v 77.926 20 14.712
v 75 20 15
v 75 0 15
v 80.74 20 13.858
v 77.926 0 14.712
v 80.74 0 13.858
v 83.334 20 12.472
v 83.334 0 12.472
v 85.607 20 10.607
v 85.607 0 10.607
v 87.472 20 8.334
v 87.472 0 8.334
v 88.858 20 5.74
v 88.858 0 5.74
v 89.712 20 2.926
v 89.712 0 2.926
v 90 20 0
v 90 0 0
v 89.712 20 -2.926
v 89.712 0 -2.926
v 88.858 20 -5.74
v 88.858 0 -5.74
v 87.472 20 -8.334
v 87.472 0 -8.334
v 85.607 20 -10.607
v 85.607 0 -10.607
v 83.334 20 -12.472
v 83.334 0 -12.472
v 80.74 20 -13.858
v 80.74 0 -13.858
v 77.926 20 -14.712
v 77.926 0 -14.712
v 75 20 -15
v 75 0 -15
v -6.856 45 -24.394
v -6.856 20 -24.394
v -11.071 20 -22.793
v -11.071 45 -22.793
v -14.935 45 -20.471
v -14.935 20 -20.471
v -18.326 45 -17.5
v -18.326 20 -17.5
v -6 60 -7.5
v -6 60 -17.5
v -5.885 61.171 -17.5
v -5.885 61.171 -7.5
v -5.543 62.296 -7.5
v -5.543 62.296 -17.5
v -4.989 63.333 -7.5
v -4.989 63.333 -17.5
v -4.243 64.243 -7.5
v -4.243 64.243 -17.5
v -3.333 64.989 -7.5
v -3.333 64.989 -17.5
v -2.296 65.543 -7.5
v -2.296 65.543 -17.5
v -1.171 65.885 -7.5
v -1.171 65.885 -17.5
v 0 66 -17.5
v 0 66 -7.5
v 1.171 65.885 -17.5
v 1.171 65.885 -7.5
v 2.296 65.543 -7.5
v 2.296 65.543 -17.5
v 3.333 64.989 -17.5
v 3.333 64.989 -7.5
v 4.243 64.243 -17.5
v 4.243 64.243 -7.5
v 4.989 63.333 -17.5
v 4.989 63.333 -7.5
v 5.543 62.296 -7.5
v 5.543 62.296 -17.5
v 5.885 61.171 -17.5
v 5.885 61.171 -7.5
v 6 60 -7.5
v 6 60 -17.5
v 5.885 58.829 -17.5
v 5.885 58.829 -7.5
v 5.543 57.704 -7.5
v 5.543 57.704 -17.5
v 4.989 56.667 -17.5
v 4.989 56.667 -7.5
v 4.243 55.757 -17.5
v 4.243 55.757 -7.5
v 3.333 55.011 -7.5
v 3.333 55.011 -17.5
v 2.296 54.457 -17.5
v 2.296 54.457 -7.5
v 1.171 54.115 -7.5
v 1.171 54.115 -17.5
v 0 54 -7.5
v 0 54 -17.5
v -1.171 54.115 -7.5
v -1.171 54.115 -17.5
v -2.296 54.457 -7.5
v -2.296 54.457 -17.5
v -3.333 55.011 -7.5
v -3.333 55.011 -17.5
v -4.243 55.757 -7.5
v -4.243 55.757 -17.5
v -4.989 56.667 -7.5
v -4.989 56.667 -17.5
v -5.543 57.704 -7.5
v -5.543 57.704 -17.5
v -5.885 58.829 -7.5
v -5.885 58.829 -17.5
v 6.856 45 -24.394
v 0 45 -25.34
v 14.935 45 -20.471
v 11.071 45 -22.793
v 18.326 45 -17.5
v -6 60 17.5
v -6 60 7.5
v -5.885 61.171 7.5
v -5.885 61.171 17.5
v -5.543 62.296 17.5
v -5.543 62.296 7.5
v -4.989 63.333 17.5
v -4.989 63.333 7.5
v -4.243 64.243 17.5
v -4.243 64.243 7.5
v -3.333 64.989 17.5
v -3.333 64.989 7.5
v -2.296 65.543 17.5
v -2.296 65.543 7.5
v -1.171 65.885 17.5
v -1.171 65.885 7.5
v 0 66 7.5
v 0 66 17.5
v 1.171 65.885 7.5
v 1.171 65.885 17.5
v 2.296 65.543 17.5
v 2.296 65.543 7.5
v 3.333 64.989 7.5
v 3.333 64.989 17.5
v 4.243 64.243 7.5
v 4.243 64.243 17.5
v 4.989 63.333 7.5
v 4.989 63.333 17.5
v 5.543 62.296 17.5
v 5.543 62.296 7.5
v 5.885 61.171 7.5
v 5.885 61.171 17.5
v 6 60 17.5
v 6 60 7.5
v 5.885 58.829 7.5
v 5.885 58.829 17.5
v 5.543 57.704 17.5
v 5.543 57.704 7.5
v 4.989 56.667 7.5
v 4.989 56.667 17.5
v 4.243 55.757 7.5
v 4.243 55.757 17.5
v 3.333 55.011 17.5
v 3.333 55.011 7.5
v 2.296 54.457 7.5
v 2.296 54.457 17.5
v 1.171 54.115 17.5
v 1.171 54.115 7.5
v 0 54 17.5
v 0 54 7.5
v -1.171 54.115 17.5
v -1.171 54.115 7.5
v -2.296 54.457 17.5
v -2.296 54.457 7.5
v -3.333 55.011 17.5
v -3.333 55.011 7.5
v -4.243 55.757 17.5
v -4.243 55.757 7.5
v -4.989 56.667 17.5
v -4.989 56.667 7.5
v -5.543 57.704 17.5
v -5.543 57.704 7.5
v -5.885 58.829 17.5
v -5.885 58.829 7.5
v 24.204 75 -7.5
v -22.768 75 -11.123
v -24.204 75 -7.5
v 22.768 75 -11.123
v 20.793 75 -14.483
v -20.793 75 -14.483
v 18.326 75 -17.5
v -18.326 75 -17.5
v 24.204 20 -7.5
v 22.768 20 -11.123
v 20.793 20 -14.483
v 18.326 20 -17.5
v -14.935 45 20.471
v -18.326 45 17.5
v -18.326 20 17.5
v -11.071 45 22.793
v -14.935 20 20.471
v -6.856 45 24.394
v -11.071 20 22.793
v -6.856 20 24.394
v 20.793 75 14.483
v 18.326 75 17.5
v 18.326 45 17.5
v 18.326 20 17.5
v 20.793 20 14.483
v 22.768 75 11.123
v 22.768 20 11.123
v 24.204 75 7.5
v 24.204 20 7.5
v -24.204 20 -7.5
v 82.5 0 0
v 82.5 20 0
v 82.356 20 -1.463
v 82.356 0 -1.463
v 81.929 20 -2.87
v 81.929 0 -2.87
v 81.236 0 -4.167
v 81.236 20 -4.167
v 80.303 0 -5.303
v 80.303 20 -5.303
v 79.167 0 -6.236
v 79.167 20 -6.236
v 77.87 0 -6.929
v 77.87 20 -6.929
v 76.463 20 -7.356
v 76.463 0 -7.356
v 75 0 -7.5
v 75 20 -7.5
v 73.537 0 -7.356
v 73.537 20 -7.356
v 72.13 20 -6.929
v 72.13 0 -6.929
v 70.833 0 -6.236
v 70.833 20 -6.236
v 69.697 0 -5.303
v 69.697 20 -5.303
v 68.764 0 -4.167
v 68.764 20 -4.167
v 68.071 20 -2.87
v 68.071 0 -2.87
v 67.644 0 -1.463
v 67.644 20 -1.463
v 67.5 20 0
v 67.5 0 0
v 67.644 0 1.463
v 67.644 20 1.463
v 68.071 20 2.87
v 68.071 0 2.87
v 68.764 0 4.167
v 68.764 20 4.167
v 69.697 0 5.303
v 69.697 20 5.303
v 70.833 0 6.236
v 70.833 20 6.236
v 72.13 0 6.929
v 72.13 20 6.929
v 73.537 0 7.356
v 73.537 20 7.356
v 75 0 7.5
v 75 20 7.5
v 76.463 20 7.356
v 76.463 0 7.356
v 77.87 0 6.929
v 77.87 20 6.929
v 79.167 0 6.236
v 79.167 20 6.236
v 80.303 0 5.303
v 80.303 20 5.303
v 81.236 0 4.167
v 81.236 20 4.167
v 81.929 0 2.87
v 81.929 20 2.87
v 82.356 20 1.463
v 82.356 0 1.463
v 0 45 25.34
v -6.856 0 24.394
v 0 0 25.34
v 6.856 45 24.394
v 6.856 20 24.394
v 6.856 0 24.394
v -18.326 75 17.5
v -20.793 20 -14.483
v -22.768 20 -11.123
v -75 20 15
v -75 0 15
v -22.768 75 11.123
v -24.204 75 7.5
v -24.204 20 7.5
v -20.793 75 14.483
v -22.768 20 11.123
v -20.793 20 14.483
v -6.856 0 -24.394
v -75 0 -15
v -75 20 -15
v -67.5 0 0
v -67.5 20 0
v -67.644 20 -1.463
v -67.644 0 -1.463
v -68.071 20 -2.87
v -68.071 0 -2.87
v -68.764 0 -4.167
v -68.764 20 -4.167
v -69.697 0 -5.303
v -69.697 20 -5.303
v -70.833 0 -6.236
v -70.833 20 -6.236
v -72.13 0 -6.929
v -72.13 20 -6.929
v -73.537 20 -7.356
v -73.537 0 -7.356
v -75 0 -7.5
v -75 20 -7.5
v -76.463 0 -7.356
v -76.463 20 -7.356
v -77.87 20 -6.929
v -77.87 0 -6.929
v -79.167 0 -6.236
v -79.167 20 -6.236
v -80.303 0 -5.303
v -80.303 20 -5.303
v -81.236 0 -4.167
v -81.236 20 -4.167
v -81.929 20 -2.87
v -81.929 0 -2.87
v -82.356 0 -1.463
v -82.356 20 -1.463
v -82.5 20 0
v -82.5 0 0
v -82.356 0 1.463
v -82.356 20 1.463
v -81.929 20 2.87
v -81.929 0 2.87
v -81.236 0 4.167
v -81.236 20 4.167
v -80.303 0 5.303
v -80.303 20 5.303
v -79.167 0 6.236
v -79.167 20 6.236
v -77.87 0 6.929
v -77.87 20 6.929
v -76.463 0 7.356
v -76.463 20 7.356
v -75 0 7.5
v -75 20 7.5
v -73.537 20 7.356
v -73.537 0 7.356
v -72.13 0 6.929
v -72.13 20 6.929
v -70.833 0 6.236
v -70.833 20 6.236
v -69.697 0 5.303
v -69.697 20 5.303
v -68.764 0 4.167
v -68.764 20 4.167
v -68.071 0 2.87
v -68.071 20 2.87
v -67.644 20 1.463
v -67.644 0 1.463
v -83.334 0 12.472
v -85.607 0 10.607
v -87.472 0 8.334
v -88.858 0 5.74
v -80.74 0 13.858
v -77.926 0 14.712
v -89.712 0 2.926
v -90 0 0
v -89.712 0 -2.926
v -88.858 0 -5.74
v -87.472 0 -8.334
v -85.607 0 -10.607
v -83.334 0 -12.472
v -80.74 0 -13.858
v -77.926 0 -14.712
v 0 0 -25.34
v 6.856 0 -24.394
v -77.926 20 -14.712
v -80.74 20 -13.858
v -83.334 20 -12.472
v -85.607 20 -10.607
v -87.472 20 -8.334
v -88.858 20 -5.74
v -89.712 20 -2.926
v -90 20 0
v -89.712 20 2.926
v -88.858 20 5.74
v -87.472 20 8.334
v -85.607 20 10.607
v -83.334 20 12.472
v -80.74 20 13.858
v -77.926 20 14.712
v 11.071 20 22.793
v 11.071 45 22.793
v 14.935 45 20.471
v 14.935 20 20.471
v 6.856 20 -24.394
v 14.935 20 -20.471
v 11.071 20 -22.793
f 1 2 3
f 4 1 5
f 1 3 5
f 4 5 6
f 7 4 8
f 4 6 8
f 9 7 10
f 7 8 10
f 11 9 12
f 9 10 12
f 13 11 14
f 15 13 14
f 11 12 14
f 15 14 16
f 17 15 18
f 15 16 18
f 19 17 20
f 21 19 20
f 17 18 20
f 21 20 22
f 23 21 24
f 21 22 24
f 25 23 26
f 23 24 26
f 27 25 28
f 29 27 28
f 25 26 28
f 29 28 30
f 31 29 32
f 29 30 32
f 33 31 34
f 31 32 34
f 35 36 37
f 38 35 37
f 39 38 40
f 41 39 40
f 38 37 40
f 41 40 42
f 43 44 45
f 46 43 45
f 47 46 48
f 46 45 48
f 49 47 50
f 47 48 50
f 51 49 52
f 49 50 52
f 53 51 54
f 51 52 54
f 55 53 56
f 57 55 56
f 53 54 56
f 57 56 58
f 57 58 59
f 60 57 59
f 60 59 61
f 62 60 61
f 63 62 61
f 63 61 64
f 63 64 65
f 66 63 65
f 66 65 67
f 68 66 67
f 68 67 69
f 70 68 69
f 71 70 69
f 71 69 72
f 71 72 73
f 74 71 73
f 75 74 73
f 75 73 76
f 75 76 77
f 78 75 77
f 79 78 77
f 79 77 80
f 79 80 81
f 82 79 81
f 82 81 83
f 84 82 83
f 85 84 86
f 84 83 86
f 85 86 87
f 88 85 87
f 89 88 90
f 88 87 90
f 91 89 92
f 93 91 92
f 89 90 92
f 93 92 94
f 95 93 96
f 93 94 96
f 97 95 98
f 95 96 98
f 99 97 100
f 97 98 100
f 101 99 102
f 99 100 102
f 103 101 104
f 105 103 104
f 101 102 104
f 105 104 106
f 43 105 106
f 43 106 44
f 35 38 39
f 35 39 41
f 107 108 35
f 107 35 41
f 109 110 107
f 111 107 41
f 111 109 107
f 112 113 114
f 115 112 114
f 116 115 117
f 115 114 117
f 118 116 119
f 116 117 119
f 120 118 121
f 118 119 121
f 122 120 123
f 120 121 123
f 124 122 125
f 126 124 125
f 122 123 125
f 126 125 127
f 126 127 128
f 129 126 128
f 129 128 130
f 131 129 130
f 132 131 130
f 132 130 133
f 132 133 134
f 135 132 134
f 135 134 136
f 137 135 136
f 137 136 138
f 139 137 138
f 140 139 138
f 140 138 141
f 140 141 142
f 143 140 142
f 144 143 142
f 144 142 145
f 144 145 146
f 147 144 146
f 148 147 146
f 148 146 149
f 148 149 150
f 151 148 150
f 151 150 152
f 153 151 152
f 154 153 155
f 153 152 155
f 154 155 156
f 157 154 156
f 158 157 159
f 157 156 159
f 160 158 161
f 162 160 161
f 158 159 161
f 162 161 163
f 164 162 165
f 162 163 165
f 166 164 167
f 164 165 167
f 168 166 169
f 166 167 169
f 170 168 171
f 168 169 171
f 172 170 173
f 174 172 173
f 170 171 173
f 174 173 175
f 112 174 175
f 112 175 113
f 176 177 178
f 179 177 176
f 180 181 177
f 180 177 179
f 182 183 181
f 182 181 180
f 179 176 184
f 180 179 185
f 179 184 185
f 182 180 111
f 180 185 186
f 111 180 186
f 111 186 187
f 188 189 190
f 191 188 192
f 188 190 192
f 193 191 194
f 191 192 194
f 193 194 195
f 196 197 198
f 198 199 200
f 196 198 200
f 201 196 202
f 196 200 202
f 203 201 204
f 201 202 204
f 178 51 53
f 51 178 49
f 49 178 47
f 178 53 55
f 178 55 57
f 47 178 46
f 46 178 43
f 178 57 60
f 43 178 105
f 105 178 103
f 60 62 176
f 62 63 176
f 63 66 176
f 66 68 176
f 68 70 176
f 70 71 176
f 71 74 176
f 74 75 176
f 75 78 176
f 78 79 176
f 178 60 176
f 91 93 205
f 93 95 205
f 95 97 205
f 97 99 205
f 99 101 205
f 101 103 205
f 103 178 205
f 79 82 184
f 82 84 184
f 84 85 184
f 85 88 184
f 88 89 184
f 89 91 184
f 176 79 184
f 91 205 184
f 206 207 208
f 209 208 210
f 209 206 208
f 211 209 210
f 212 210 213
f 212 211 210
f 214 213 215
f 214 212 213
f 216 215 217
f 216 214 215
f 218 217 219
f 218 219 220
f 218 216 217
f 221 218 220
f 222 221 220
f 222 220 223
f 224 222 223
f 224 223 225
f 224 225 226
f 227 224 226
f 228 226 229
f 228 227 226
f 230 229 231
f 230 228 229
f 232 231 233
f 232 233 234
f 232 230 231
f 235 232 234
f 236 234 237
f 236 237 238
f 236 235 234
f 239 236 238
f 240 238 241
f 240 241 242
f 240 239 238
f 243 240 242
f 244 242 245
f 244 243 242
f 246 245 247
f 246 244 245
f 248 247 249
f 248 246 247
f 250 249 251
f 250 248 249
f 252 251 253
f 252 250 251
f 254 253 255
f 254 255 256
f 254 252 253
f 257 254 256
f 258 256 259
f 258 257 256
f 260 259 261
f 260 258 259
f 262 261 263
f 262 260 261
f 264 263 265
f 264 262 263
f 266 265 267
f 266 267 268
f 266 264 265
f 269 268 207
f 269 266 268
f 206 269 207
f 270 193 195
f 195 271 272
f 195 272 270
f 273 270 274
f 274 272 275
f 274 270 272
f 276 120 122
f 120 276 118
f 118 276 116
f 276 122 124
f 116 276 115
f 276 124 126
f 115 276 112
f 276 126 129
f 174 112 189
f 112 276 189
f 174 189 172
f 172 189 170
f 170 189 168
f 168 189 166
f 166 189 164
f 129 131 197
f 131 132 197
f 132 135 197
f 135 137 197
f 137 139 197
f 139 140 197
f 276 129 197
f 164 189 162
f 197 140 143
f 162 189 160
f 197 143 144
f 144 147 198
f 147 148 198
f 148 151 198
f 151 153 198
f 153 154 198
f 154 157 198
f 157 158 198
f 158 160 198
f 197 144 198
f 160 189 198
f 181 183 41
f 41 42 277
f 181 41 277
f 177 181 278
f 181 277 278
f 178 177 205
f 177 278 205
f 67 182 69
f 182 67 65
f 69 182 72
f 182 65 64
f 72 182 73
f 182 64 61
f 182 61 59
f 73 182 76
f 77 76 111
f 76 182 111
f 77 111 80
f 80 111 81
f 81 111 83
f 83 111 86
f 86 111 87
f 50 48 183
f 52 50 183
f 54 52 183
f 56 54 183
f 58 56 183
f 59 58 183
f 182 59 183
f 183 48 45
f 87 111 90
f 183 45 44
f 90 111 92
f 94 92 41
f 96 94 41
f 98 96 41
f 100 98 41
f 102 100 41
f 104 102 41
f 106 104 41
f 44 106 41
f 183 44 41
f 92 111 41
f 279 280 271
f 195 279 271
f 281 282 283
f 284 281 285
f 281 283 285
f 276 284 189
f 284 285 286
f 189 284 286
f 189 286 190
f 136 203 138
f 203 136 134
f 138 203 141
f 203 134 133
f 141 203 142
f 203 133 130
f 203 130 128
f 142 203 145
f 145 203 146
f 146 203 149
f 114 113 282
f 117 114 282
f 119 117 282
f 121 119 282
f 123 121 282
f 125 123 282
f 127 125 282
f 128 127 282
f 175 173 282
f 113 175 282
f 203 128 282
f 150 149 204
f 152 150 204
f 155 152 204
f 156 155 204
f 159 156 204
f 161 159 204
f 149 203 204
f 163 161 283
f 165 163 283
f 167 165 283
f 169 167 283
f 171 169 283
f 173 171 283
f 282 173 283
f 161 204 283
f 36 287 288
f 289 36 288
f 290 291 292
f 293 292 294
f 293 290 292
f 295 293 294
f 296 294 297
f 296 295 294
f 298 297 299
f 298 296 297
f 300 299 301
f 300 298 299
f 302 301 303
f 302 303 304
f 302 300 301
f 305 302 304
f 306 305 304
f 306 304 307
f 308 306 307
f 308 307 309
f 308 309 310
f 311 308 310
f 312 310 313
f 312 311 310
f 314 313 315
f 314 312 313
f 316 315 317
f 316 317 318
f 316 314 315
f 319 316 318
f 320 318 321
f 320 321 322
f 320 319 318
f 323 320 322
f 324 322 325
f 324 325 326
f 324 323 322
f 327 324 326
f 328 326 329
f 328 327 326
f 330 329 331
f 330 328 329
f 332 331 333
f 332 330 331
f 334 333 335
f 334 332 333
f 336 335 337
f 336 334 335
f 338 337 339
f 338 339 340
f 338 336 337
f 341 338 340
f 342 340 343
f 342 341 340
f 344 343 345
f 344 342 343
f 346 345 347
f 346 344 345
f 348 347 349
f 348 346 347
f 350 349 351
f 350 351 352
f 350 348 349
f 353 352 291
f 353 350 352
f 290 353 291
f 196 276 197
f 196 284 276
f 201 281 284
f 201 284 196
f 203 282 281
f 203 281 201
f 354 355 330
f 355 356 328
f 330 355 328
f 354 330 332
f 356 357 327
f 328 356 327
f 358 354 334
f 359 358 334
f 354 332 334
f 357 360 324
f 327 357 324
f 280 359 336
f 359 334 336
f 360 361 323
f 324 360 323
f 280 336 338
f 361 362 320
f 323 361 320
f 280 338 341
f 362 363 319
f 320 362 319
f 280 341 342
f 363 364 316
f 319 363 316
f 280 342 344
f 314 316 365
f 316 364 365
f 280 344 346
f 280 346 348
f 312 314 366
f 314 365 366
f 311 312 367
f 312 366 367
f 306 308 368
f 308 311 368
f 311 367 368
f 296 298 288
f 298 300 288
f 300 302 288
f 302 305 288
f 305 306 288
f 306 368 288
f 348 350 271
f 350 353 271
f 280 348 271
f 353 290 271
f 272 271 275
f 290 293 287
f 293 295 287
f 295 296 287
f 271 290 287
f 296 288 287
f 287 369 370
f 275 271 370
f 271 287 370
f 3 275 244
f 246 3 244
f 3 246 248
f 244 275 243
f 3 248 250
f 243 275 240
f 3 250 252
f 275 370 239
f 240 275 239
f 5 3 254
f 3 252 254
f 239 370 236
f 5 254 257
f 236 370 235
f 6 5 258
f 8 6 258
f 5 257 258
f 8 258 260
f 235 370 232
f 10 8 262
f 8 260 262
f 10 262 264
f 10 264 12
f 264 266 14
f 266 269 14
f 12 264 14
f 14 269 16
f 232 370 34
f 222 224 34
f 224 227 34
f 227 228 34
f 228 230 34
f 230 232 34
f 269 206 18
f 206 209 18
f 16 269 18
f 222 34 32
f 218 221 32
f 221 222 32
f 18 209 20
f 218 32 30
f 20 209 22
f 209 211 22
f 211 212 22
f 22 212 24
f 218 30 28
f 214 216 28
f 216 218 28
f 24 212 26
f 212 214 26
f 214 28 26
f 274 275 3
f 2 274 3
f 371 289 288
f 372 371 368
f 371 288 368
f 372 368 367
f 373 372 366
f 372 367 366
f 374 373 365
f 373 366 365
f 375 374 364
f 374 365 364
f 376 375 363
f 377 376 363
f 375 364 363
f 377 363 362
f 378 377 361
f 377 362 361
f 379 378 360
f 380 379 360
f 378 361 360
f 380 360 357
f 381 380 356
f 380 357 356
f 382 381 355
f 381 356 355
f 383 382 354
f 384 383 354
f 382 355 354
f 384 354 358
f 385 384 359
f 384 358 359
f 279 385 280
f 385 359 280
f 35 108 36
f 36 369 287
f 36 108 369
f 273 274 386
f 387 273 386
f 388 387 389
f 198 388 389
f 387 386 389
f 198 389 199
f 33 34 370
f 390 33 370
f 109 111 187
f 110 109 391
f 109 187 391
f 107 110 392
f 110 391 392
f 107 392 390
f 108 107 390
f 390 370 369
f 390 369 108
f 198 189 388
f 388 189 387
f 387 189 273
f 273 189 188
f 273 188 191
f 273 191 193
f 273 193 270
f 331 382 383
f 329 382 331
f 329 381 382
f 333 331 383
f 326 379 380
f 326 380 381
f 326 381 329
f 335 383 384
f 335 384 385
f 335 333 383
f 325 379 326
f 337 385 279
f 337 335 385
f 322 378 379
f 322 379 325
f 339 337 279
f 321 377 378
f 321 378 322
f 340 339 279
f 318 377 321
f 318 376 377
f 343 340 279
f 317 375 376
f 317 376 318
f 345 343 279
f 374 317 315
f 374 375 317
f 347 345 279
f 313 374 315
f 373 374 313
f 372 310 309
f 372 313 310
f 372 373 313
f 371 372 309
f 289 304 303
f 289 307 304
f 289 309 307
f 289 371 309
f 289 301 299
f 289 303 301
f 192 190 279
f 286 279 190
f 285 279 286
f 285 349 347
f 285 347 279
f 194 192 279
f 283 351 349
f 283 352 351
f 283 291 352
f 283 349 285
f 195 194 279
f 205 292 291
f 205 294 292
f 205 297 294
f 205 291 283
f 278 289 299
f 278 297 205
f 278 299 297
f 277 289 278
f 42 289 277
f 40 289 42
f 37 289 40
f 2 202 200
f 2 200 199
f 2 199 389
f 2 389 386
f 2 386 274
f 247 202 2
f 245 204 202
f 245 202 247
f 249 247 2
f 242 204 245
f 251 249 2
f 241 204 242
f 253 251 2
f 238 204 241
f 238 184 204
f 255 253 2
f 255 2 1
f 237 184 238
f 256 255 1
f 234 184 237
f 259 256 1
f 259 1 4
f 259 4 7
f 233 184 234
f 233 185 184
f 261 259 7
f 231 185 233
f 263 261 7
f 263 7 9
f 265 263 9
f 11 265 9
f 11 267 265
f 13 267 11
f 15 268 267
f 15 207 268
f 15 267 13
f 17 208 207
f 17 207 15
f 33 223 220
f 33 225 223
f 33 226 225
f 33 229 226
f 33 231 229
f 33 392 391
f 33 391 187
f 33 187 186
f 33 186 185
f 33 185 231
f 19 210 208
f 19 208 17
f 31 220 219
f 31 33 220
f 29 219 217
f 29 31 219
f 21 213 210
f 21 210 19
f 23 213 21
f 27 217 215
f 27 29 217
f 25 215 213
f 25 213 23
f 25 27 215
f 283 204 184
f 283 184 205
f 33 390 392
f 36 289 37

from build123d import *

# Parameters (mm, degrees)
CROQUIS_PLANTA_R           = 7.5
SALIENTE_EXTRUIR1_DEPTH    = 20
SALIENTE_EXTRUIR2_DEPTH    = 45
SALIENTE_EXTRUIR3_DEPTH    = 75
CROQUIS14_R                = 6
CORTAR_EXTRUIR1_DEPTH      = 8.83956507
CORTAR_EXTRUIR1_DEPTH_BACK = 43.83956507


with BuildPart() as part:
    # Croquis Planta → Saliente-Extruir1 (new body)
    with BuildSketch(Plane(origin=(0, 0, 0), x_dir=(1, 0, 0), z_dir=(0, 1, 0))):
        with BuildLine():
            ThreePointArc((-6.856359495, -24.394341401), (-25.33956507, 0), (-6.856359495, 24.394341401))
            Line((-6.856359495, 24.394341401), (-75, 15))
            ThreePointArc((-75, 15), (-90, 0), (-75, -15))
            Line((-75, -15), (-6.856359495, -24.394341401))
        make_face()
        with Locations((-75, 0)):
            Circle(CROQUIS_PLANTA_R, mode=Mode.SUBTRACT)
        with BuildLine():
            ThreePointArc((75, -15), (90, 0), (75, 15))
            Line((75, 15), (6.856359495, 24.394341401))
            ThreePointArc((6.856359495, 24.394341401), (20.196914684, 15.302881924), (25.33956507, 0))
            ThreePointArc((25.33956507, 0), (20.196914684, -15.302881924), (6.856359495, -24.394341401))
            Line((6.856359495, -24.394341401), (75, -15))
        make_face()
        with Locations((75, 0)):
            Circle(CROQUIS_PLANTA_R, mode=Mode.SUBTRACT)
        with BuildLine():
            ThreePointArc((25.33956507, 0), (20.196914684, 15.302881924), (6.856359495, 24.394341401))
            Line((6.856359495, 24.394341401), (0, 25.33956507))
            Line((0, 25.33956507), (-6.856359495, 24.394341401))
            ThreePointArc((-6.856359495, 24.394341401), (-25.33956507, 0), (-6.856359495, -24.394341401))
            Line((-6.856359495, -24.394341401), (0, -25.33956507))
            Line((0, -25.33956507), (6.856359495, -24.394341401))
            ThreePointArc((6.856359495, -24.394341401), (20.196914684, -15.302881924), (25.33956507, 0))
        make_face()
    extrude(amount=SALIENTE_EXTRUIR1_DEPTH)

    # Croquis11 → Saliente-Extruir2 (add)
    with BuildSketch(Plane(origin=(0, 0, 0), x_dir=(1, 0, 0), z_dir=(0, 1, 0))):
        with BuildLine():
            ThreePointArc((24.204205377, 7.5), (21.845030009, 12.840880882), (18.326034976, 17.5))
            Line((18.326034976, 17.5), (-18.326034976, 17.5))
            ThreePointArc((-18.326034976, 17.5), (-21.845030009, 12.840880882), (-24.204205377, 7.5))
            Line((-24.204205377, 7.5), (24.204205377, 7.5))
        make_face()
        with BuildLine():
            ThreePointArc((18.326034976, 17.5), (13.05454839, 21.718018424), (6.856359495, 24.394341401))
            Line((6.856359495, 24.394341401), (0, 25.33956507))
            Line((0, 25.33956507), (-6.856359495, 24.394341401))
            ThreePointArc((-6.856359495, 24.394341401), (-13.05454839, 21.718018424), (-18.326034976, 17.5))
            Line((-18.326034976, 17.5), (18.326034976, 17.5))
        make_face()
        with BuildLine():
            Line((-18.326034976, -17.5), (18.326034976, -17.5))
            ThreePointArc((18.326034976, -17.5), (21.845030009, -12.840880882), (24.204205377, -7.5))
            Line((24.204205377, -7.5), (-24.204205377, -7.5))
            ThreePointArc((-24.204205377, -7.5), (-21.845030009, -12.840880882), (-18.326034976, -17.5))
        make_face()
        with BuildLine():
            Line((0, -25.33956507), (6.856359495, -24.394341401))
            ThreePointArc((6.856359495, -24.394341401), (13.05454839, -21.718018424), (18.326034976, -17.5))
            Line((18.326034976, -17.5), (-18.326034976, -17.5))
            ThreePointArc((-18.326034976, -17.5), (-13.05454839, -21.718018424), (-6.856359495, -24.394341401))
            Line((-6.856359495, -24.394341401), (0, -25.33956507))
        make_face()
    extrude(amount=SALIENTE_EXTRUIR2_DEPTH)

    # Croquis12 → Saliente-Extruir3 (add)
    with BuildSketch(Plane(origin=(0, 0, 0), x_dir=(1, 0, 0), z_dir=(0, 1, 0))):
        with BuildLine():
            ThreePointArc((24.204205377, 7.5), (21.845030009, 12.840880882), (18.326034976, 17.5))
            Line((18.326034976, 17.5), (-18.326034976, 17.5))
            ThreePointArc((-18.326034976, 17.5), (-21.845030009, 12.840880882), (-24.204205377, 7.5))
            Line((-24.204205377, 7.5), (24.204205377, 7.5))
        make_face()
        with BuildLine():
            Line((-18.326034976, -17.5), (18.326034976, -17.5))
            ThreePointArc((18.326034976, -17.5), (21.845030009, -12.840880882), (24.204205377, -7.5))
            Line((24.204205377, -7.5), (-24.204205377, -7.5))
            ThreePointArc((-24.204205377, -7.5), (-21.845030009, -12.840880882), (-18.326034976, -17.5))
        make_face()
    extrude(amount=SALIENTE_EXTRUIR3_DEPTH)

    # Croquis14 → Cortar-Extruir1 (cut, two sides)
    with BuildSketch(Plane(origin=(0, 0, -17.5), x_dir=(-1, 0, 0), z_dir=(0, 0, -1))) as cortar_extruir1_sk:
        with Locations((0, 60)):
            Circle(CROQUIS14_R)
    extrude(amount=CORTAR_EXTRUIR1_DEPTH, mode=Mode.SUBTRACT)
    extrude(cortar_extruir1_sk.sketch, amount=-CORTAR_EXTRUIR1_DEPTH_BACK, mode=Mode.SUBTRACT)


solid = part.part
